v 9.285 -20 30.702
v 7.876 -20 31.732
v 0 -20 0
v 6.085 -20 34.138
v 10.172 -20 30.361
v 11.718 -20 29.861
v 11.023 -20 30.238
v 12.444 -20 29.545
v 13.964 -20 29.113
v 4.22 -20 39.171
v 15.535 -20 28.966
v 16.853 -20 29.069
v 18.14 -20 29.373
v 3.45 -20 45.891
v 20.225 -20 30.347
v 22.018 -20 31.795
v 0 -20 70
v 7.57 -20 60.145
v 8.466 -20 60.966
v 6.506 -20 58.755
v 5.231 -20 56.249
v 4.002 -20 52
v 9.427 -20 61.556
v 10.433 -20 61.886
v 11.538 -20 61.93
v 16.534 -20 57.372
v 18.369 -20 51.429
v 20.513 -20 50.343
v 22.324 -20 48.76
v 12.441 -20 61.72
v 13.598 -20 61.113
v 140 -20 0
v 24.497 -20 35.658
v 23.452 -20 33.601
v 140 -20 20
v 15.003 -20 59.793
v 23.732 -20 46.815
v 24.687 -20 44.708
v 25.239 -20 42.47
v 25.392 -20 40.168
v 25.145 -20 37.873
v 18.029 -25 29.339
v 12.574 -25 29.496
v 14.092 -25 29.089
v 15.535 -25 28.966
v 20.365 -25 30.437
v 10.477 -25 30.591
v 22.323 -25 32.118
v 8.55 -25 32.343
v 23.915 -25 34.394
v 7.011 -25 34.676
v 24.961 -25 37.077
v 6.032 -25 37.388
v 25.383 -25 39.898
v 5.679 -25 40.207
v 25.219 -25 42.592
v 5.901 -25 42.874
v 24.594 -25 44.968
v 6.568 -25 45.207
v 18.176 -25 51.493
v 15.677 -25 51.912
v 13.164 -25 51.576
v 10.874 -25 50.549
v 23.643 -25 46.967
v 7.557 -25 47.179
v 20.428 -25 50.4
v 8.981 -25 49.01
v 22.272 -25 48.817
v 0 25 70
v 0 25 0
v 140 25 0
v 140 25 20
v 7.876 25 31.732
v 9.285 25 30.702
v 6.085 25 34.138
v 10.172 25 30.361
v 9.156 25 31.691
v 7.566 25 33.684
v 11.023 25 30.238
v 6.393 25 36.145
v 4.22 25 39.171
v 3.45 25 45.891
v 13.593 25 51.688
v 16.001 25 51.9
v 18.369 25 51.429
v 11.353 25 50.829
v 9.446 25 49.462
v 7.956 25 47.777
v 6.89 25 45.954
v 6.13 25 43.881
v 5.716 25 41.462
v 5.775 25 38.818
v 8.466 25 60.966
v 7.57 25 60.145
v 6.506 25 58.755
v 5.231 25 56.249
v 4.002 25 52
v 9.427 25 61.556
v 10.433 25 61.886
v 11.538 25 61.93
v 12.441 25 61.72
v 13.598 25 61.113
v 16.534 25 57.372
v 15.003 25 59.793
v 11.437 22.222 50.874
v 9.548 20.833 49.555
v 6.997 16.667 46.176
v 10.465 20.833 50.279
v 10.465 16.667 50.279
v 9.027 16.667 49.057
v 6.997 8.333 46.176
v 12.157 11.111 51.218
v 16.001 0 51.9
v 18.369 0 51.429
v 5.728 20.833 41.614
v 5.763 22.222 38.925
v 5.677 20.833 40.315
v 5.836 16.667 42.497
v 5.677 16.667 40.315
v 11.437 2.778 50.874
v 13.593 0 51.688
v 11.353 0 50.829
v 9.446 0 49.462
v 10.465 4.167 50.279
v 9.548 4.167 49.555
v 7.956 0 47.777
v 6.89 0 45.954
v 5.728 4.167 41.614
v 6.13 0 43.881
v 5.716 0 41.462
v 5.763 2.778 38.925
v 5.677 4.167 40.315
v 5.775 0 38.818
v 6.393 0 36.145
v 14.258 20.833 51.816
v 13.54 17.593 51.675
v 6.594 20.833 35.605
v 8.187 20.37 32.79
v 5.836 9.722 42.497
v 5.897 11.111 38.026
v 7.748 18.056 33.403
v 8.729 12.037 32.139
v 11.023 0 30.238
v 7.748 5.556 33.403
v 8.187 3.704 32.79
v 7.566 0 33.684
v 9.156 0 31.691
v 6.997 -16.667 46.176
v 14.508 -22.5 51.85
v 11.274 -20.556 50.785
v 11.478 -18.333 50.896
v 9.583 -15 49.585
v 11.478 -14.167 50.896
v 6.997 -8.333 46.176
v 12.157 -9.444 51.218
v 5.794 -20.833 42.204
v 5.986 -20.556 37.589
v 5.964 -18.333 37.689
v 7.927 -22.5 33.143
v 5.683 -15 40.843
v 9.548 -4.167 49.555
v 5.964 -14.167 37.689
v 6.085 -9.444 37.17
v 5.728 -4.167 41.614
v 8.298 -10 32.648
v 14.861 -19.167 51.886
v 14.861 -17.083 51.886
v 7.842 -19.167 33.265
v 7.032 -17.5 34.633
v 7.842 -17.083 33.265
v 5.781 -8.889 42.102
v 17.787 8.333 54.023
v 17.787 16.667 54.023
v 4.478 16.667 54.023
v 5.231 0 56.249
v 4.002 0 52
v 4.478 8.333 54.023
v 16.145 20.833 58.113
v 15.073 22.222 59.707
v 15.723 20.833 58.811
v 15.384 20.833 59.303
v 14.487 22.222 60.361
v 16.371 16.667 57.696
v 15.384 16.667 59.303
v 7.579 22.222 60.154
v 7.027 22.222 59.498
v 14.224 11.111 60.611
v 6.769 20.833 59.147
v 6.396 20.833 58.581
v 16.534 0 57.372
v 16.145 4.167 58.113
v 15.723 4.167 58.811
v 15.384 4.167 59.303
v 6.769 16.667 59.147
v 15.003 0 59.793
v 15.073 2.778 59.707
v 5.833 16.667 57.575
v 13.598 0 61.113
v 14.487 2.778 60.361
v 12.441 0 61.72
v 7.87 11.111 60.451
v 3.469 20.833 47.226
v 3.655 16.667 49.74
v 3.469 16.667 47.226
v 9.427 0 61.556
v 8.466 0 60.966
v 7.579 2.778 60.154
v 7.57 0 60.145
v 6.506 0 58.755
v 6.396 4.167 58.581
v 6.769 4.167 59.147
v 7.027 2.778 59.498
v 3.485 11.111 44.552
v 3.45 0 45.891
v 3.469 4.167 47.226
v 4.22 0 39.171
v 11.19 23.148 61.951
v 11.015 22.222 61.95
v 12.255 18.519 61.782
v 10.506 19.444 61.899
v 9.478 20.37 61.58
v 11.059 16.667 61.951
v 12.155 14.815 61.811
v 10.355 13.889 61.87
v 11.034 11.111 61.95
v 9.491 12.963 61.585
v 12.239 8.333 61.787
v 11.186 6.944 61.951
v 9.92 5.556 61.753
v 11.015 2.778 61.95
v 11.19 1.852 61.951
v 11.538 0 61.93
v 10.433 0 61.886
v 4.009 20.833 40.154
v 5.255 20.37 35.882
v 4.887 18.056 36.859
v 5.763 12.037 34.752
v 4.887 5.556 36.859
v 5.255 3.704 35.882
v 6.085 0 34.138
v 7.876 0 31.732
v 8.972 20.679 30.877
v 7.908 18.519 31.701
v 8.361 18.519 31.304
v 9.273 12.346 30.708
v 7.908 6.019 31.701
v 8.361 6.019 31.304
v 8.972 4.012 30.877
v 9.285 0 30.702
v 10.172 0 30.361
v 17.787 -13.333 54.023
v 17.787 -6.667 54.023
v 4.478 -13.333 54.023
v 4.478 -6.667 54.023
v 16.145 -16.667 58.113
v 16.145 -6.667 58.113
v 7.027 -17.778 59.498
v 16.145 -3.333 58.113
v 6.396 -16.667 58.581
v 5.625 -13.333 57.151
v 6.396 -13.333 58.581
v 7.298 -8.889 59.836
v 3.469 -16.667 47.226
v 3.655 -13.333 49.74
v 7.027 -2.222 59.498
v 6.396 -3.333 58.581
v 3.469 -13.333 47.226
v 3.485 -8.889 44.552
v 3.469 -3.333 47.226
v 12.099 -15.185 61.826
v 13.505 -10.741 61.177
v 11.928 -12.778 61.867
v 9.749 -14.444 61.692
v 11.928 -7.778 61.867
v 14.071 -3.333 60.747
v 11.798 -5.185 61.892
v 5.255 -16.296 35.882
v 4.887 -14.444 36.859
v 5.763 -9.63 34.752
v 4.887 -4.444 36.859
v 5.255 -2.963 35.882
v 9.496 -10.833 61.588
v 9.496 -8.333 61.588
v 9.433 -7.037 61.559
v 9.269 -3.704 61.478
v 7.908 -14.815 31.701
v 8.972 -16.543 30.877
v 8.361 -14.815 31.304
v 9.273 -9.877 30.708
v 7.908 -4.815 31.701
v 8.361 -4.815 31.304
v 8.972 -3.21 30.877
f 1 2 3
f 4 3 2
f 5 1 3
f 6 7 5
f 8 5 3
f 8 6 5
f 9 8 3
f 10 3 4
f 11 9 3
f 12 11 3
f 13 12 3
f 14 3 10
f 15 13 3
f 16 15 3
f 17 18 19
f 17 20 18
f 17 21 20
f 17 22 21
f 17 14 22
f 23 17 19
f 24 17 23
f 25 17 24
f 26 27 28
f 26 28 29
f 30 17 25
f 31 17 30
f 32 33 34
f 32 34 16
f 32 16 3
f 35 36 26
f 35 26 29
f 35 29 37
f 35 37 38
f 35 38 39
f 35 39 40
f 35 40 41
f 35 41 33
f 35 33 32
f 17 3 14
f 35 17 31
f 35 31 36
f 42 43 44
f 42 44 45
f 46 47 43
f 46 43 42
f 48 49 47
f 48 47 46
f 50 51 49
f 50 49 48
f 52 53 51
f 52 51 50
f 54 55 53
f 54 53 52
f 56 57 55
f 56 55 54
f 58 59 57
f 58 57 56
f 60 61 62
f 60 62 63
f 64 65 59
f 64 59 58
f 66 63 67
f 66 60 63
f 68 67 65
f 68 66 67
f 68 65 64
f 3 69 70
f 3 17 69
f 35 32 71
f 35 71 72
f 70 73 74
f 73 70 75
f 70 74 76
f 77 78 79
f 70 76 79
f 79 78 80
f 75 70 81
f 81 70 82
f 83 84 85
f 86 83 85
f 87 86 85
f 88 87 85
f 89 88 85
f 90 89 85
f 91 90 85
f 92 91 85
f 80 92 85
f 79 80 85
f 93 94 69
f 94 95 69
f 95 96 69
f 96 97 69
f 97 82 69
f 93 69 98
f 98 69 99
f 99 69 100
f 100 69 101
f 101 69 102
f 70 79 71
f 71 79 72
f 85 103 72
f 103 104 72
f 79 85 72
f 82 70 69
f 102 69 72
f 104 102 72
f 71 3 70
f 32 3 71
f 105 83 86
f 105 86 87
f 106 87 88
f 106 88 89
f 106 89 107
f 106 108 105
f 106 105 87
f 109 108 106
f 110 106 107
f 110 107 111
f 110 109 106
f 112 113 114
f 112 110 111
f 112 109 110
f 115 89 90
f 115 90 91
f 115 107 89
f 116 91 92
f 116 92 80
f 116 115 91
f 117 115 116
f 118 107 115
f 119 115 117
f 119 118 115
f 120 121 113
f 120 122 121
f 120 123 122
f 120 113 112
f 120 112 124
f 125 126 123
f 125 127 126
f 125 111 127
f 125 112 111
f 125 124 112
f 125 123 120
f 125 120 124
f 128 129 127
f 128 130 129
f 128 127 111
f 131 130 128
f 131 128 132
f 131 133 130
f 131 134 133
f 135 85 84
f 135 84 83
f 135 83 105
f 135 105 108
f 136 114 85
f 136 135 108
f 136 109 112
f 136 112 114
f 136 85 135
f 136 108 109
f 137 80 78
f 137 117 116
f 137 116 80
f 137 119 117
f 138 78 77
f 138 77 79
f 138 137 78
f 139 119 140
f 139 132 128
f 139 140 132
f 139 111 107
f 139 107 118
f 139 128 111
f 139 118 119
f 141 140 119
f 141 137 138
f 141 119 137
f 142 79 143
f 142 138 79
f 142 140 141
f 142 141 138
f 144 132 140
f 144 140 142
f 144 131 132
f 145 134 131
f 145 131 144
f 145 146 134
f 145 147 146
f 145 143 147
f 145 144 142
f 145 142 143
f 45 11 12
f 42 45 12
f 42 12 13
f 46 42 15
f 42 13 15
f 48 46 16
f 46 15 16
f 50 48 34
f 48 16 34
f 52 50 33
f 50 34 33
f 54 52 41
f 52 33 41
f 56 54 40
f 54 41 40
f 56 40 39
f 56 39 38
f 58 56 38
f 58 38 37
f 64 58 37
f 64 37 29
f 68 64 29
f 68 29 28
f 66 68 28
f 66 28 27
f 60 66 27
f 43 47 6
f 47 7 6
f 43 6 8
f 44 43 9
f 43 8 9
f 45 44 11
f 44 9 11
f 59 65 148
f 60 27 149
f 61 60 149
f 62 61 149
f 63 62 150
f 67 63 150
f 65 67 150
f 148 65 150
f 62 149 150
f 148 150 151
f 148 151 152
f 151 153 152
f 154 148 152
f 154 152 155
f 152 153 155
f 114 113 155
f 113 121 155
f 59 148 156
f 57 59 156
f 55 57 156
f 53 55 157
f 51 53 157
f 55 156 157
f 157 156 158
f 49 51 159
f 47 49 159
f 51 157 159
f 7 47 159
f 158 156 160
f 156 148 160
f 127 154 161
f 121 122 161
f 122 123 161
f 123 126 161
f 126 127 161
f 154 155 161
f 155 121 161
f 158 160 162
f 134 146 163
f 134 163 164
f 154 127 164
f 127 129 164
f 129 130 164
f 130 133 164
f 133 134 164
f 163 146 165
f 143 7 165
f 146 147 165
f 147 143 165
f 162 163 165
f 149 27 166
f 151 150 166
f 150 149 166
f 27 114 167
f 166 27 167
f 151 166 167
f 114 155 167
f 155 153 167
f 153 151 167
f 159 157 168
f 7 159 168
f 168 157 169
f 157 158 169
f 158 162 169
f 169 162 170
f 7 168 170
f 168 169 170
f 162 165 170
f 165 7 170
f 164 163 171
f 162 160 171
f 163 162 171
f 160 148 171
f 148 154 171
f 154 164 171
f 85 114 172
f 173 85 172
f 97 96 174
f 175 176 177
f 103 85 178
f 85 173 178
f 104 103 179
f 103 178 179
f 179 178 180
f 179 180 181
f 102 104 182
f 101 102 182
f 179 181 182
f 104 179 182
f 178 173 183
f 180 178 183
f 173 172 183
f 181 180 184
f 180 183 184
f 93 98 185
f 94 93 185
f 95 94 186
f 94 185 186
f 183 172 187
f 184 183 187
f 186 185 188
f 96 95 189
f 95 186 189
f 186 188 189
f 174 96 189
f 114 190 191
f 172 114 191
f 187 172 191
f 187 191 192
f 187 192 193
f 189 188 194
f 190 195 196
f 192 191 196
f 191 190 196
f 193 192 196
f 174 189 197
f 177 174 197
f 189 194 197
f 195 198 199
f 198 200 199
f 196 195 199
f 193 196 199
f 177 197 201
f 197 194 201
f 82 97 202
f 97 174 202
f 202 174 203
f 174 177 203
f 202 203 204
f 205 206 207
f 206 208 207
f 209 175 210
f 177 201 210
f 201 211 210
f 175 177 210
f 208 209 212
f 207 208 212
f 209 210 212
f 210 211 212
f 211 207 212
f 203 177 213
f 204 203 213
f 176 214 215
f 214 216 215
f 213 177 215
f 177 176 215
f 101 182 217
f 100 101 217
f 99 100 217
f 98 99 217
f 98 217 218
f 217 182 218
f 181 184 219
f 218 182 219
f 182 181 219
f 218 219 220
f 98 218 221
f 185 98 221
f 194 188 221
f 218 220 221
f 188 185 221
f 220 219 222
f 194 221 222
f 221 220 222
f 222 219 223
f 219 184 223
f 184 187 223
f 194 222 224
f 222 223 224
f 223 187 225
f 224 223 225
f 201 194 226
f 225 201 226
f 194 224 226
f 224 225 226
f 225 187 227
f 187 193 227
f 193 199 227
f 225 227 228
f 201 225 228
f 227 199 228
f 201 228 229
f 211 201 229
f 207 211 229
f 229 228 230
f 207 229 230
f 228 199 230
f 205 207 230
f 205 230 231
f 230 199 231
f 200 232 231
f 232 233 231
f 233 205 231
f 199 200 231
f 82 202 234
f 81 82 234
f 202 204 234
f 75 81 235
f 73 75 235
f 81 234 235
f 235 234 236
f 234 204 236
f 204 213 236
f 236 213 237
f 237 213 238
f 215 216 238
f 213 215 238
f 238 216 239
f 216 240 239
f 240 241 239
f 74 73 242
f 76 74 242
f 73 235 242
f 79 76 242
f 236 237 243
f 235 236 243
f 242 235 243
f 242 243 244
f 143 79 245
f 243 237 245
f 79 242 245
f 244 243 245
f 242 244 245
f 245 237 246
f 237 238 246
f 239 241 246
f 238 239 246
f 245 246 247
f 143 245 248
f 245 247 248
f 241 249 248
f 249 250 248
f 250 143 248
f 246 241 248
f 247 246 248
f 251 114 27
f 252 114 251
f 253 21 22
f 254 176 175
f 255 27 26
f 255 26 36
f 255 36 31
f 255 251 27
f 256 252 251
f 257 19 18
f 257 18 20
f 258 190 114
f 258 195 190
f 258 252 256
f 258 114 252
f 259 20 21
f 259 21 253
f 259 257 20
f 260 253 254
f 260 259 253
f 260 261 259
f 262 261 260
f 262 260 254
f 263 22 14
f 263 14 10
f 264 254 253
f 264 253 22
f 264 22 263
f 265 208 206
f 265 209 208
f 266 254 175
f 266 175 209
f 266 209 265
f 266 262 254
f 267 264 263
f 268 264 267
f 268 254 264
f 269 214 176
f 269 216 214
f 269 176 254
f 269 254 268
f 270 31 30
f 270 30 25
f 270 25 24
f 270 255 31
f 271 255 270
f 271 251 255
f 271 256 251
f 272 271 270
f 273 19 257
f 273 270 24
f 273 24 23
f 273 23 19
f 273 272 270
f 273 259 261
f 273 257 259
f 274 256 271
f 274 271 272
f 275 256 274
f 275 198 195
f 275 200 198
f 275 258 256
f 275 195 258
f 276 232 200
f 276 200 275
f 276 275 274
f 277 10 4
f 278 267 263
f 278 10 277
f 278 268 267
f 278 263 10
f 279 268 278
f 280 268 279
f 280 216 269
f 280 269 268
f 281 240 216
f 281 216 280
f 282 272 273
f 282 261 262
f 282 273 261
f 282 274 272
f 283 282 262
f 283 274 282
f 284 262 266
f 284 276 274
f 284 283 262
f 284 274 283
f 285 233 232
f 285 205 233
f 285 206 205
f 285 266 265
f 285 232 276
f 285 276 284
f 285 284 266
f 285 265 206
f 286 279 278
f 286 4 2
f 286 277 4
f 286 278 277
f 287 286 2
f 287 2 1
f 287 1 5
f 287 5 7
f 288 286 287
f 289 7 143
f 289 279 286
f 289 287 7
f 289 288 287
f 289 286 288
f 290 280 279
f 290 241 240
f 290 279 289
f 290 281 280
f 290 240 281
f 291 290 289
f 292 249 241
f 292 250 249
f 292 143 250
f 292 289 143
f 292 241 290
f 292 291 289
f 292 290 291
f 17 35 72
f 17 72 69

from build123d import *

# Parameters (mm, degrees)
F1_DEPTH = 20
F3_DEPTH = 25
F4_DEPTH = 10
F5_DEPTH = 25


with BuildPart() as f1:
    # F0 (on Front) → F1 (new body)
    with BuildSketch(Plane.XZ):
        Polygon((0, 70), (0, 0), (140, 0), (140, 20), align=None)
        with BuildLine():
            add(Edge.make_bspline(
                [(11.1326770857, 30.2367769182), (24.4411659607, 30.2367769182), (17.7869215232, 54.0230367333), (11.1326770857, 77.8092965484), (4.4784326482, 54.0230367333), (-2.1758117893, 30.2367769182), (11.1326770857, 30.2367769182)],
                knots=[0, 0, 0, 2.0943951024, 2.0943951024, 4.1887902048, 4.1887902048, 6.2831853072, 6.2831853072, 6.2831853072], degree=2, weights=[1, 0.5, 1, 0.5, 1, 0.5, 1]))
        make_face(mode=Mode.SUBTRACT)
    extrude(amount=F1_DEPTH)

    # F2 (on Front) → F3 (join)
    with BuildSketch(Plane.XZ):
        with BuildLine():
            add(Edge.make_bspline(
                [(15.5354021117, 28.9658699185), (32.6115375413, 28.9658699185), (24.0734698265, 46.1759930477), (15.5354021117, 63.3861161768), (6.9973343969, 46.1759930477), (-1.5407333179, 28.9658699185), (15.5354021117, 28.9658699185)],
                knots=[0, 0, 0, 2.0943951024, 2.0943951024, 4.1887902048, 4.1887902048, 6.2831853072, 6.2831853072, 6.2831853072], degree=2, weights=[1, 0.5, 1, 0.5, 1, 0.5, 1]))
        make_face()
    extrude(amount=F3_DEPTH)

    # F4 (add): a face of the model
    f4_faces = [f1.faces().sort_by_distance(p)[0] for p in [
        (15.5354021117, -25, 40.4671142495),
    ]]
    extrude(f4_faces, amount=-F4_DEPTH)

    # F5 (add): a face of the model
    f5_faces = [f1.faces().sort_by_distance(p)[0] for p in [
        (58.3197071439, 0, 24.0820721981),
    ]]
    extrude(f5_faces, amount=F5_DEPTH)


solid = f1.part
